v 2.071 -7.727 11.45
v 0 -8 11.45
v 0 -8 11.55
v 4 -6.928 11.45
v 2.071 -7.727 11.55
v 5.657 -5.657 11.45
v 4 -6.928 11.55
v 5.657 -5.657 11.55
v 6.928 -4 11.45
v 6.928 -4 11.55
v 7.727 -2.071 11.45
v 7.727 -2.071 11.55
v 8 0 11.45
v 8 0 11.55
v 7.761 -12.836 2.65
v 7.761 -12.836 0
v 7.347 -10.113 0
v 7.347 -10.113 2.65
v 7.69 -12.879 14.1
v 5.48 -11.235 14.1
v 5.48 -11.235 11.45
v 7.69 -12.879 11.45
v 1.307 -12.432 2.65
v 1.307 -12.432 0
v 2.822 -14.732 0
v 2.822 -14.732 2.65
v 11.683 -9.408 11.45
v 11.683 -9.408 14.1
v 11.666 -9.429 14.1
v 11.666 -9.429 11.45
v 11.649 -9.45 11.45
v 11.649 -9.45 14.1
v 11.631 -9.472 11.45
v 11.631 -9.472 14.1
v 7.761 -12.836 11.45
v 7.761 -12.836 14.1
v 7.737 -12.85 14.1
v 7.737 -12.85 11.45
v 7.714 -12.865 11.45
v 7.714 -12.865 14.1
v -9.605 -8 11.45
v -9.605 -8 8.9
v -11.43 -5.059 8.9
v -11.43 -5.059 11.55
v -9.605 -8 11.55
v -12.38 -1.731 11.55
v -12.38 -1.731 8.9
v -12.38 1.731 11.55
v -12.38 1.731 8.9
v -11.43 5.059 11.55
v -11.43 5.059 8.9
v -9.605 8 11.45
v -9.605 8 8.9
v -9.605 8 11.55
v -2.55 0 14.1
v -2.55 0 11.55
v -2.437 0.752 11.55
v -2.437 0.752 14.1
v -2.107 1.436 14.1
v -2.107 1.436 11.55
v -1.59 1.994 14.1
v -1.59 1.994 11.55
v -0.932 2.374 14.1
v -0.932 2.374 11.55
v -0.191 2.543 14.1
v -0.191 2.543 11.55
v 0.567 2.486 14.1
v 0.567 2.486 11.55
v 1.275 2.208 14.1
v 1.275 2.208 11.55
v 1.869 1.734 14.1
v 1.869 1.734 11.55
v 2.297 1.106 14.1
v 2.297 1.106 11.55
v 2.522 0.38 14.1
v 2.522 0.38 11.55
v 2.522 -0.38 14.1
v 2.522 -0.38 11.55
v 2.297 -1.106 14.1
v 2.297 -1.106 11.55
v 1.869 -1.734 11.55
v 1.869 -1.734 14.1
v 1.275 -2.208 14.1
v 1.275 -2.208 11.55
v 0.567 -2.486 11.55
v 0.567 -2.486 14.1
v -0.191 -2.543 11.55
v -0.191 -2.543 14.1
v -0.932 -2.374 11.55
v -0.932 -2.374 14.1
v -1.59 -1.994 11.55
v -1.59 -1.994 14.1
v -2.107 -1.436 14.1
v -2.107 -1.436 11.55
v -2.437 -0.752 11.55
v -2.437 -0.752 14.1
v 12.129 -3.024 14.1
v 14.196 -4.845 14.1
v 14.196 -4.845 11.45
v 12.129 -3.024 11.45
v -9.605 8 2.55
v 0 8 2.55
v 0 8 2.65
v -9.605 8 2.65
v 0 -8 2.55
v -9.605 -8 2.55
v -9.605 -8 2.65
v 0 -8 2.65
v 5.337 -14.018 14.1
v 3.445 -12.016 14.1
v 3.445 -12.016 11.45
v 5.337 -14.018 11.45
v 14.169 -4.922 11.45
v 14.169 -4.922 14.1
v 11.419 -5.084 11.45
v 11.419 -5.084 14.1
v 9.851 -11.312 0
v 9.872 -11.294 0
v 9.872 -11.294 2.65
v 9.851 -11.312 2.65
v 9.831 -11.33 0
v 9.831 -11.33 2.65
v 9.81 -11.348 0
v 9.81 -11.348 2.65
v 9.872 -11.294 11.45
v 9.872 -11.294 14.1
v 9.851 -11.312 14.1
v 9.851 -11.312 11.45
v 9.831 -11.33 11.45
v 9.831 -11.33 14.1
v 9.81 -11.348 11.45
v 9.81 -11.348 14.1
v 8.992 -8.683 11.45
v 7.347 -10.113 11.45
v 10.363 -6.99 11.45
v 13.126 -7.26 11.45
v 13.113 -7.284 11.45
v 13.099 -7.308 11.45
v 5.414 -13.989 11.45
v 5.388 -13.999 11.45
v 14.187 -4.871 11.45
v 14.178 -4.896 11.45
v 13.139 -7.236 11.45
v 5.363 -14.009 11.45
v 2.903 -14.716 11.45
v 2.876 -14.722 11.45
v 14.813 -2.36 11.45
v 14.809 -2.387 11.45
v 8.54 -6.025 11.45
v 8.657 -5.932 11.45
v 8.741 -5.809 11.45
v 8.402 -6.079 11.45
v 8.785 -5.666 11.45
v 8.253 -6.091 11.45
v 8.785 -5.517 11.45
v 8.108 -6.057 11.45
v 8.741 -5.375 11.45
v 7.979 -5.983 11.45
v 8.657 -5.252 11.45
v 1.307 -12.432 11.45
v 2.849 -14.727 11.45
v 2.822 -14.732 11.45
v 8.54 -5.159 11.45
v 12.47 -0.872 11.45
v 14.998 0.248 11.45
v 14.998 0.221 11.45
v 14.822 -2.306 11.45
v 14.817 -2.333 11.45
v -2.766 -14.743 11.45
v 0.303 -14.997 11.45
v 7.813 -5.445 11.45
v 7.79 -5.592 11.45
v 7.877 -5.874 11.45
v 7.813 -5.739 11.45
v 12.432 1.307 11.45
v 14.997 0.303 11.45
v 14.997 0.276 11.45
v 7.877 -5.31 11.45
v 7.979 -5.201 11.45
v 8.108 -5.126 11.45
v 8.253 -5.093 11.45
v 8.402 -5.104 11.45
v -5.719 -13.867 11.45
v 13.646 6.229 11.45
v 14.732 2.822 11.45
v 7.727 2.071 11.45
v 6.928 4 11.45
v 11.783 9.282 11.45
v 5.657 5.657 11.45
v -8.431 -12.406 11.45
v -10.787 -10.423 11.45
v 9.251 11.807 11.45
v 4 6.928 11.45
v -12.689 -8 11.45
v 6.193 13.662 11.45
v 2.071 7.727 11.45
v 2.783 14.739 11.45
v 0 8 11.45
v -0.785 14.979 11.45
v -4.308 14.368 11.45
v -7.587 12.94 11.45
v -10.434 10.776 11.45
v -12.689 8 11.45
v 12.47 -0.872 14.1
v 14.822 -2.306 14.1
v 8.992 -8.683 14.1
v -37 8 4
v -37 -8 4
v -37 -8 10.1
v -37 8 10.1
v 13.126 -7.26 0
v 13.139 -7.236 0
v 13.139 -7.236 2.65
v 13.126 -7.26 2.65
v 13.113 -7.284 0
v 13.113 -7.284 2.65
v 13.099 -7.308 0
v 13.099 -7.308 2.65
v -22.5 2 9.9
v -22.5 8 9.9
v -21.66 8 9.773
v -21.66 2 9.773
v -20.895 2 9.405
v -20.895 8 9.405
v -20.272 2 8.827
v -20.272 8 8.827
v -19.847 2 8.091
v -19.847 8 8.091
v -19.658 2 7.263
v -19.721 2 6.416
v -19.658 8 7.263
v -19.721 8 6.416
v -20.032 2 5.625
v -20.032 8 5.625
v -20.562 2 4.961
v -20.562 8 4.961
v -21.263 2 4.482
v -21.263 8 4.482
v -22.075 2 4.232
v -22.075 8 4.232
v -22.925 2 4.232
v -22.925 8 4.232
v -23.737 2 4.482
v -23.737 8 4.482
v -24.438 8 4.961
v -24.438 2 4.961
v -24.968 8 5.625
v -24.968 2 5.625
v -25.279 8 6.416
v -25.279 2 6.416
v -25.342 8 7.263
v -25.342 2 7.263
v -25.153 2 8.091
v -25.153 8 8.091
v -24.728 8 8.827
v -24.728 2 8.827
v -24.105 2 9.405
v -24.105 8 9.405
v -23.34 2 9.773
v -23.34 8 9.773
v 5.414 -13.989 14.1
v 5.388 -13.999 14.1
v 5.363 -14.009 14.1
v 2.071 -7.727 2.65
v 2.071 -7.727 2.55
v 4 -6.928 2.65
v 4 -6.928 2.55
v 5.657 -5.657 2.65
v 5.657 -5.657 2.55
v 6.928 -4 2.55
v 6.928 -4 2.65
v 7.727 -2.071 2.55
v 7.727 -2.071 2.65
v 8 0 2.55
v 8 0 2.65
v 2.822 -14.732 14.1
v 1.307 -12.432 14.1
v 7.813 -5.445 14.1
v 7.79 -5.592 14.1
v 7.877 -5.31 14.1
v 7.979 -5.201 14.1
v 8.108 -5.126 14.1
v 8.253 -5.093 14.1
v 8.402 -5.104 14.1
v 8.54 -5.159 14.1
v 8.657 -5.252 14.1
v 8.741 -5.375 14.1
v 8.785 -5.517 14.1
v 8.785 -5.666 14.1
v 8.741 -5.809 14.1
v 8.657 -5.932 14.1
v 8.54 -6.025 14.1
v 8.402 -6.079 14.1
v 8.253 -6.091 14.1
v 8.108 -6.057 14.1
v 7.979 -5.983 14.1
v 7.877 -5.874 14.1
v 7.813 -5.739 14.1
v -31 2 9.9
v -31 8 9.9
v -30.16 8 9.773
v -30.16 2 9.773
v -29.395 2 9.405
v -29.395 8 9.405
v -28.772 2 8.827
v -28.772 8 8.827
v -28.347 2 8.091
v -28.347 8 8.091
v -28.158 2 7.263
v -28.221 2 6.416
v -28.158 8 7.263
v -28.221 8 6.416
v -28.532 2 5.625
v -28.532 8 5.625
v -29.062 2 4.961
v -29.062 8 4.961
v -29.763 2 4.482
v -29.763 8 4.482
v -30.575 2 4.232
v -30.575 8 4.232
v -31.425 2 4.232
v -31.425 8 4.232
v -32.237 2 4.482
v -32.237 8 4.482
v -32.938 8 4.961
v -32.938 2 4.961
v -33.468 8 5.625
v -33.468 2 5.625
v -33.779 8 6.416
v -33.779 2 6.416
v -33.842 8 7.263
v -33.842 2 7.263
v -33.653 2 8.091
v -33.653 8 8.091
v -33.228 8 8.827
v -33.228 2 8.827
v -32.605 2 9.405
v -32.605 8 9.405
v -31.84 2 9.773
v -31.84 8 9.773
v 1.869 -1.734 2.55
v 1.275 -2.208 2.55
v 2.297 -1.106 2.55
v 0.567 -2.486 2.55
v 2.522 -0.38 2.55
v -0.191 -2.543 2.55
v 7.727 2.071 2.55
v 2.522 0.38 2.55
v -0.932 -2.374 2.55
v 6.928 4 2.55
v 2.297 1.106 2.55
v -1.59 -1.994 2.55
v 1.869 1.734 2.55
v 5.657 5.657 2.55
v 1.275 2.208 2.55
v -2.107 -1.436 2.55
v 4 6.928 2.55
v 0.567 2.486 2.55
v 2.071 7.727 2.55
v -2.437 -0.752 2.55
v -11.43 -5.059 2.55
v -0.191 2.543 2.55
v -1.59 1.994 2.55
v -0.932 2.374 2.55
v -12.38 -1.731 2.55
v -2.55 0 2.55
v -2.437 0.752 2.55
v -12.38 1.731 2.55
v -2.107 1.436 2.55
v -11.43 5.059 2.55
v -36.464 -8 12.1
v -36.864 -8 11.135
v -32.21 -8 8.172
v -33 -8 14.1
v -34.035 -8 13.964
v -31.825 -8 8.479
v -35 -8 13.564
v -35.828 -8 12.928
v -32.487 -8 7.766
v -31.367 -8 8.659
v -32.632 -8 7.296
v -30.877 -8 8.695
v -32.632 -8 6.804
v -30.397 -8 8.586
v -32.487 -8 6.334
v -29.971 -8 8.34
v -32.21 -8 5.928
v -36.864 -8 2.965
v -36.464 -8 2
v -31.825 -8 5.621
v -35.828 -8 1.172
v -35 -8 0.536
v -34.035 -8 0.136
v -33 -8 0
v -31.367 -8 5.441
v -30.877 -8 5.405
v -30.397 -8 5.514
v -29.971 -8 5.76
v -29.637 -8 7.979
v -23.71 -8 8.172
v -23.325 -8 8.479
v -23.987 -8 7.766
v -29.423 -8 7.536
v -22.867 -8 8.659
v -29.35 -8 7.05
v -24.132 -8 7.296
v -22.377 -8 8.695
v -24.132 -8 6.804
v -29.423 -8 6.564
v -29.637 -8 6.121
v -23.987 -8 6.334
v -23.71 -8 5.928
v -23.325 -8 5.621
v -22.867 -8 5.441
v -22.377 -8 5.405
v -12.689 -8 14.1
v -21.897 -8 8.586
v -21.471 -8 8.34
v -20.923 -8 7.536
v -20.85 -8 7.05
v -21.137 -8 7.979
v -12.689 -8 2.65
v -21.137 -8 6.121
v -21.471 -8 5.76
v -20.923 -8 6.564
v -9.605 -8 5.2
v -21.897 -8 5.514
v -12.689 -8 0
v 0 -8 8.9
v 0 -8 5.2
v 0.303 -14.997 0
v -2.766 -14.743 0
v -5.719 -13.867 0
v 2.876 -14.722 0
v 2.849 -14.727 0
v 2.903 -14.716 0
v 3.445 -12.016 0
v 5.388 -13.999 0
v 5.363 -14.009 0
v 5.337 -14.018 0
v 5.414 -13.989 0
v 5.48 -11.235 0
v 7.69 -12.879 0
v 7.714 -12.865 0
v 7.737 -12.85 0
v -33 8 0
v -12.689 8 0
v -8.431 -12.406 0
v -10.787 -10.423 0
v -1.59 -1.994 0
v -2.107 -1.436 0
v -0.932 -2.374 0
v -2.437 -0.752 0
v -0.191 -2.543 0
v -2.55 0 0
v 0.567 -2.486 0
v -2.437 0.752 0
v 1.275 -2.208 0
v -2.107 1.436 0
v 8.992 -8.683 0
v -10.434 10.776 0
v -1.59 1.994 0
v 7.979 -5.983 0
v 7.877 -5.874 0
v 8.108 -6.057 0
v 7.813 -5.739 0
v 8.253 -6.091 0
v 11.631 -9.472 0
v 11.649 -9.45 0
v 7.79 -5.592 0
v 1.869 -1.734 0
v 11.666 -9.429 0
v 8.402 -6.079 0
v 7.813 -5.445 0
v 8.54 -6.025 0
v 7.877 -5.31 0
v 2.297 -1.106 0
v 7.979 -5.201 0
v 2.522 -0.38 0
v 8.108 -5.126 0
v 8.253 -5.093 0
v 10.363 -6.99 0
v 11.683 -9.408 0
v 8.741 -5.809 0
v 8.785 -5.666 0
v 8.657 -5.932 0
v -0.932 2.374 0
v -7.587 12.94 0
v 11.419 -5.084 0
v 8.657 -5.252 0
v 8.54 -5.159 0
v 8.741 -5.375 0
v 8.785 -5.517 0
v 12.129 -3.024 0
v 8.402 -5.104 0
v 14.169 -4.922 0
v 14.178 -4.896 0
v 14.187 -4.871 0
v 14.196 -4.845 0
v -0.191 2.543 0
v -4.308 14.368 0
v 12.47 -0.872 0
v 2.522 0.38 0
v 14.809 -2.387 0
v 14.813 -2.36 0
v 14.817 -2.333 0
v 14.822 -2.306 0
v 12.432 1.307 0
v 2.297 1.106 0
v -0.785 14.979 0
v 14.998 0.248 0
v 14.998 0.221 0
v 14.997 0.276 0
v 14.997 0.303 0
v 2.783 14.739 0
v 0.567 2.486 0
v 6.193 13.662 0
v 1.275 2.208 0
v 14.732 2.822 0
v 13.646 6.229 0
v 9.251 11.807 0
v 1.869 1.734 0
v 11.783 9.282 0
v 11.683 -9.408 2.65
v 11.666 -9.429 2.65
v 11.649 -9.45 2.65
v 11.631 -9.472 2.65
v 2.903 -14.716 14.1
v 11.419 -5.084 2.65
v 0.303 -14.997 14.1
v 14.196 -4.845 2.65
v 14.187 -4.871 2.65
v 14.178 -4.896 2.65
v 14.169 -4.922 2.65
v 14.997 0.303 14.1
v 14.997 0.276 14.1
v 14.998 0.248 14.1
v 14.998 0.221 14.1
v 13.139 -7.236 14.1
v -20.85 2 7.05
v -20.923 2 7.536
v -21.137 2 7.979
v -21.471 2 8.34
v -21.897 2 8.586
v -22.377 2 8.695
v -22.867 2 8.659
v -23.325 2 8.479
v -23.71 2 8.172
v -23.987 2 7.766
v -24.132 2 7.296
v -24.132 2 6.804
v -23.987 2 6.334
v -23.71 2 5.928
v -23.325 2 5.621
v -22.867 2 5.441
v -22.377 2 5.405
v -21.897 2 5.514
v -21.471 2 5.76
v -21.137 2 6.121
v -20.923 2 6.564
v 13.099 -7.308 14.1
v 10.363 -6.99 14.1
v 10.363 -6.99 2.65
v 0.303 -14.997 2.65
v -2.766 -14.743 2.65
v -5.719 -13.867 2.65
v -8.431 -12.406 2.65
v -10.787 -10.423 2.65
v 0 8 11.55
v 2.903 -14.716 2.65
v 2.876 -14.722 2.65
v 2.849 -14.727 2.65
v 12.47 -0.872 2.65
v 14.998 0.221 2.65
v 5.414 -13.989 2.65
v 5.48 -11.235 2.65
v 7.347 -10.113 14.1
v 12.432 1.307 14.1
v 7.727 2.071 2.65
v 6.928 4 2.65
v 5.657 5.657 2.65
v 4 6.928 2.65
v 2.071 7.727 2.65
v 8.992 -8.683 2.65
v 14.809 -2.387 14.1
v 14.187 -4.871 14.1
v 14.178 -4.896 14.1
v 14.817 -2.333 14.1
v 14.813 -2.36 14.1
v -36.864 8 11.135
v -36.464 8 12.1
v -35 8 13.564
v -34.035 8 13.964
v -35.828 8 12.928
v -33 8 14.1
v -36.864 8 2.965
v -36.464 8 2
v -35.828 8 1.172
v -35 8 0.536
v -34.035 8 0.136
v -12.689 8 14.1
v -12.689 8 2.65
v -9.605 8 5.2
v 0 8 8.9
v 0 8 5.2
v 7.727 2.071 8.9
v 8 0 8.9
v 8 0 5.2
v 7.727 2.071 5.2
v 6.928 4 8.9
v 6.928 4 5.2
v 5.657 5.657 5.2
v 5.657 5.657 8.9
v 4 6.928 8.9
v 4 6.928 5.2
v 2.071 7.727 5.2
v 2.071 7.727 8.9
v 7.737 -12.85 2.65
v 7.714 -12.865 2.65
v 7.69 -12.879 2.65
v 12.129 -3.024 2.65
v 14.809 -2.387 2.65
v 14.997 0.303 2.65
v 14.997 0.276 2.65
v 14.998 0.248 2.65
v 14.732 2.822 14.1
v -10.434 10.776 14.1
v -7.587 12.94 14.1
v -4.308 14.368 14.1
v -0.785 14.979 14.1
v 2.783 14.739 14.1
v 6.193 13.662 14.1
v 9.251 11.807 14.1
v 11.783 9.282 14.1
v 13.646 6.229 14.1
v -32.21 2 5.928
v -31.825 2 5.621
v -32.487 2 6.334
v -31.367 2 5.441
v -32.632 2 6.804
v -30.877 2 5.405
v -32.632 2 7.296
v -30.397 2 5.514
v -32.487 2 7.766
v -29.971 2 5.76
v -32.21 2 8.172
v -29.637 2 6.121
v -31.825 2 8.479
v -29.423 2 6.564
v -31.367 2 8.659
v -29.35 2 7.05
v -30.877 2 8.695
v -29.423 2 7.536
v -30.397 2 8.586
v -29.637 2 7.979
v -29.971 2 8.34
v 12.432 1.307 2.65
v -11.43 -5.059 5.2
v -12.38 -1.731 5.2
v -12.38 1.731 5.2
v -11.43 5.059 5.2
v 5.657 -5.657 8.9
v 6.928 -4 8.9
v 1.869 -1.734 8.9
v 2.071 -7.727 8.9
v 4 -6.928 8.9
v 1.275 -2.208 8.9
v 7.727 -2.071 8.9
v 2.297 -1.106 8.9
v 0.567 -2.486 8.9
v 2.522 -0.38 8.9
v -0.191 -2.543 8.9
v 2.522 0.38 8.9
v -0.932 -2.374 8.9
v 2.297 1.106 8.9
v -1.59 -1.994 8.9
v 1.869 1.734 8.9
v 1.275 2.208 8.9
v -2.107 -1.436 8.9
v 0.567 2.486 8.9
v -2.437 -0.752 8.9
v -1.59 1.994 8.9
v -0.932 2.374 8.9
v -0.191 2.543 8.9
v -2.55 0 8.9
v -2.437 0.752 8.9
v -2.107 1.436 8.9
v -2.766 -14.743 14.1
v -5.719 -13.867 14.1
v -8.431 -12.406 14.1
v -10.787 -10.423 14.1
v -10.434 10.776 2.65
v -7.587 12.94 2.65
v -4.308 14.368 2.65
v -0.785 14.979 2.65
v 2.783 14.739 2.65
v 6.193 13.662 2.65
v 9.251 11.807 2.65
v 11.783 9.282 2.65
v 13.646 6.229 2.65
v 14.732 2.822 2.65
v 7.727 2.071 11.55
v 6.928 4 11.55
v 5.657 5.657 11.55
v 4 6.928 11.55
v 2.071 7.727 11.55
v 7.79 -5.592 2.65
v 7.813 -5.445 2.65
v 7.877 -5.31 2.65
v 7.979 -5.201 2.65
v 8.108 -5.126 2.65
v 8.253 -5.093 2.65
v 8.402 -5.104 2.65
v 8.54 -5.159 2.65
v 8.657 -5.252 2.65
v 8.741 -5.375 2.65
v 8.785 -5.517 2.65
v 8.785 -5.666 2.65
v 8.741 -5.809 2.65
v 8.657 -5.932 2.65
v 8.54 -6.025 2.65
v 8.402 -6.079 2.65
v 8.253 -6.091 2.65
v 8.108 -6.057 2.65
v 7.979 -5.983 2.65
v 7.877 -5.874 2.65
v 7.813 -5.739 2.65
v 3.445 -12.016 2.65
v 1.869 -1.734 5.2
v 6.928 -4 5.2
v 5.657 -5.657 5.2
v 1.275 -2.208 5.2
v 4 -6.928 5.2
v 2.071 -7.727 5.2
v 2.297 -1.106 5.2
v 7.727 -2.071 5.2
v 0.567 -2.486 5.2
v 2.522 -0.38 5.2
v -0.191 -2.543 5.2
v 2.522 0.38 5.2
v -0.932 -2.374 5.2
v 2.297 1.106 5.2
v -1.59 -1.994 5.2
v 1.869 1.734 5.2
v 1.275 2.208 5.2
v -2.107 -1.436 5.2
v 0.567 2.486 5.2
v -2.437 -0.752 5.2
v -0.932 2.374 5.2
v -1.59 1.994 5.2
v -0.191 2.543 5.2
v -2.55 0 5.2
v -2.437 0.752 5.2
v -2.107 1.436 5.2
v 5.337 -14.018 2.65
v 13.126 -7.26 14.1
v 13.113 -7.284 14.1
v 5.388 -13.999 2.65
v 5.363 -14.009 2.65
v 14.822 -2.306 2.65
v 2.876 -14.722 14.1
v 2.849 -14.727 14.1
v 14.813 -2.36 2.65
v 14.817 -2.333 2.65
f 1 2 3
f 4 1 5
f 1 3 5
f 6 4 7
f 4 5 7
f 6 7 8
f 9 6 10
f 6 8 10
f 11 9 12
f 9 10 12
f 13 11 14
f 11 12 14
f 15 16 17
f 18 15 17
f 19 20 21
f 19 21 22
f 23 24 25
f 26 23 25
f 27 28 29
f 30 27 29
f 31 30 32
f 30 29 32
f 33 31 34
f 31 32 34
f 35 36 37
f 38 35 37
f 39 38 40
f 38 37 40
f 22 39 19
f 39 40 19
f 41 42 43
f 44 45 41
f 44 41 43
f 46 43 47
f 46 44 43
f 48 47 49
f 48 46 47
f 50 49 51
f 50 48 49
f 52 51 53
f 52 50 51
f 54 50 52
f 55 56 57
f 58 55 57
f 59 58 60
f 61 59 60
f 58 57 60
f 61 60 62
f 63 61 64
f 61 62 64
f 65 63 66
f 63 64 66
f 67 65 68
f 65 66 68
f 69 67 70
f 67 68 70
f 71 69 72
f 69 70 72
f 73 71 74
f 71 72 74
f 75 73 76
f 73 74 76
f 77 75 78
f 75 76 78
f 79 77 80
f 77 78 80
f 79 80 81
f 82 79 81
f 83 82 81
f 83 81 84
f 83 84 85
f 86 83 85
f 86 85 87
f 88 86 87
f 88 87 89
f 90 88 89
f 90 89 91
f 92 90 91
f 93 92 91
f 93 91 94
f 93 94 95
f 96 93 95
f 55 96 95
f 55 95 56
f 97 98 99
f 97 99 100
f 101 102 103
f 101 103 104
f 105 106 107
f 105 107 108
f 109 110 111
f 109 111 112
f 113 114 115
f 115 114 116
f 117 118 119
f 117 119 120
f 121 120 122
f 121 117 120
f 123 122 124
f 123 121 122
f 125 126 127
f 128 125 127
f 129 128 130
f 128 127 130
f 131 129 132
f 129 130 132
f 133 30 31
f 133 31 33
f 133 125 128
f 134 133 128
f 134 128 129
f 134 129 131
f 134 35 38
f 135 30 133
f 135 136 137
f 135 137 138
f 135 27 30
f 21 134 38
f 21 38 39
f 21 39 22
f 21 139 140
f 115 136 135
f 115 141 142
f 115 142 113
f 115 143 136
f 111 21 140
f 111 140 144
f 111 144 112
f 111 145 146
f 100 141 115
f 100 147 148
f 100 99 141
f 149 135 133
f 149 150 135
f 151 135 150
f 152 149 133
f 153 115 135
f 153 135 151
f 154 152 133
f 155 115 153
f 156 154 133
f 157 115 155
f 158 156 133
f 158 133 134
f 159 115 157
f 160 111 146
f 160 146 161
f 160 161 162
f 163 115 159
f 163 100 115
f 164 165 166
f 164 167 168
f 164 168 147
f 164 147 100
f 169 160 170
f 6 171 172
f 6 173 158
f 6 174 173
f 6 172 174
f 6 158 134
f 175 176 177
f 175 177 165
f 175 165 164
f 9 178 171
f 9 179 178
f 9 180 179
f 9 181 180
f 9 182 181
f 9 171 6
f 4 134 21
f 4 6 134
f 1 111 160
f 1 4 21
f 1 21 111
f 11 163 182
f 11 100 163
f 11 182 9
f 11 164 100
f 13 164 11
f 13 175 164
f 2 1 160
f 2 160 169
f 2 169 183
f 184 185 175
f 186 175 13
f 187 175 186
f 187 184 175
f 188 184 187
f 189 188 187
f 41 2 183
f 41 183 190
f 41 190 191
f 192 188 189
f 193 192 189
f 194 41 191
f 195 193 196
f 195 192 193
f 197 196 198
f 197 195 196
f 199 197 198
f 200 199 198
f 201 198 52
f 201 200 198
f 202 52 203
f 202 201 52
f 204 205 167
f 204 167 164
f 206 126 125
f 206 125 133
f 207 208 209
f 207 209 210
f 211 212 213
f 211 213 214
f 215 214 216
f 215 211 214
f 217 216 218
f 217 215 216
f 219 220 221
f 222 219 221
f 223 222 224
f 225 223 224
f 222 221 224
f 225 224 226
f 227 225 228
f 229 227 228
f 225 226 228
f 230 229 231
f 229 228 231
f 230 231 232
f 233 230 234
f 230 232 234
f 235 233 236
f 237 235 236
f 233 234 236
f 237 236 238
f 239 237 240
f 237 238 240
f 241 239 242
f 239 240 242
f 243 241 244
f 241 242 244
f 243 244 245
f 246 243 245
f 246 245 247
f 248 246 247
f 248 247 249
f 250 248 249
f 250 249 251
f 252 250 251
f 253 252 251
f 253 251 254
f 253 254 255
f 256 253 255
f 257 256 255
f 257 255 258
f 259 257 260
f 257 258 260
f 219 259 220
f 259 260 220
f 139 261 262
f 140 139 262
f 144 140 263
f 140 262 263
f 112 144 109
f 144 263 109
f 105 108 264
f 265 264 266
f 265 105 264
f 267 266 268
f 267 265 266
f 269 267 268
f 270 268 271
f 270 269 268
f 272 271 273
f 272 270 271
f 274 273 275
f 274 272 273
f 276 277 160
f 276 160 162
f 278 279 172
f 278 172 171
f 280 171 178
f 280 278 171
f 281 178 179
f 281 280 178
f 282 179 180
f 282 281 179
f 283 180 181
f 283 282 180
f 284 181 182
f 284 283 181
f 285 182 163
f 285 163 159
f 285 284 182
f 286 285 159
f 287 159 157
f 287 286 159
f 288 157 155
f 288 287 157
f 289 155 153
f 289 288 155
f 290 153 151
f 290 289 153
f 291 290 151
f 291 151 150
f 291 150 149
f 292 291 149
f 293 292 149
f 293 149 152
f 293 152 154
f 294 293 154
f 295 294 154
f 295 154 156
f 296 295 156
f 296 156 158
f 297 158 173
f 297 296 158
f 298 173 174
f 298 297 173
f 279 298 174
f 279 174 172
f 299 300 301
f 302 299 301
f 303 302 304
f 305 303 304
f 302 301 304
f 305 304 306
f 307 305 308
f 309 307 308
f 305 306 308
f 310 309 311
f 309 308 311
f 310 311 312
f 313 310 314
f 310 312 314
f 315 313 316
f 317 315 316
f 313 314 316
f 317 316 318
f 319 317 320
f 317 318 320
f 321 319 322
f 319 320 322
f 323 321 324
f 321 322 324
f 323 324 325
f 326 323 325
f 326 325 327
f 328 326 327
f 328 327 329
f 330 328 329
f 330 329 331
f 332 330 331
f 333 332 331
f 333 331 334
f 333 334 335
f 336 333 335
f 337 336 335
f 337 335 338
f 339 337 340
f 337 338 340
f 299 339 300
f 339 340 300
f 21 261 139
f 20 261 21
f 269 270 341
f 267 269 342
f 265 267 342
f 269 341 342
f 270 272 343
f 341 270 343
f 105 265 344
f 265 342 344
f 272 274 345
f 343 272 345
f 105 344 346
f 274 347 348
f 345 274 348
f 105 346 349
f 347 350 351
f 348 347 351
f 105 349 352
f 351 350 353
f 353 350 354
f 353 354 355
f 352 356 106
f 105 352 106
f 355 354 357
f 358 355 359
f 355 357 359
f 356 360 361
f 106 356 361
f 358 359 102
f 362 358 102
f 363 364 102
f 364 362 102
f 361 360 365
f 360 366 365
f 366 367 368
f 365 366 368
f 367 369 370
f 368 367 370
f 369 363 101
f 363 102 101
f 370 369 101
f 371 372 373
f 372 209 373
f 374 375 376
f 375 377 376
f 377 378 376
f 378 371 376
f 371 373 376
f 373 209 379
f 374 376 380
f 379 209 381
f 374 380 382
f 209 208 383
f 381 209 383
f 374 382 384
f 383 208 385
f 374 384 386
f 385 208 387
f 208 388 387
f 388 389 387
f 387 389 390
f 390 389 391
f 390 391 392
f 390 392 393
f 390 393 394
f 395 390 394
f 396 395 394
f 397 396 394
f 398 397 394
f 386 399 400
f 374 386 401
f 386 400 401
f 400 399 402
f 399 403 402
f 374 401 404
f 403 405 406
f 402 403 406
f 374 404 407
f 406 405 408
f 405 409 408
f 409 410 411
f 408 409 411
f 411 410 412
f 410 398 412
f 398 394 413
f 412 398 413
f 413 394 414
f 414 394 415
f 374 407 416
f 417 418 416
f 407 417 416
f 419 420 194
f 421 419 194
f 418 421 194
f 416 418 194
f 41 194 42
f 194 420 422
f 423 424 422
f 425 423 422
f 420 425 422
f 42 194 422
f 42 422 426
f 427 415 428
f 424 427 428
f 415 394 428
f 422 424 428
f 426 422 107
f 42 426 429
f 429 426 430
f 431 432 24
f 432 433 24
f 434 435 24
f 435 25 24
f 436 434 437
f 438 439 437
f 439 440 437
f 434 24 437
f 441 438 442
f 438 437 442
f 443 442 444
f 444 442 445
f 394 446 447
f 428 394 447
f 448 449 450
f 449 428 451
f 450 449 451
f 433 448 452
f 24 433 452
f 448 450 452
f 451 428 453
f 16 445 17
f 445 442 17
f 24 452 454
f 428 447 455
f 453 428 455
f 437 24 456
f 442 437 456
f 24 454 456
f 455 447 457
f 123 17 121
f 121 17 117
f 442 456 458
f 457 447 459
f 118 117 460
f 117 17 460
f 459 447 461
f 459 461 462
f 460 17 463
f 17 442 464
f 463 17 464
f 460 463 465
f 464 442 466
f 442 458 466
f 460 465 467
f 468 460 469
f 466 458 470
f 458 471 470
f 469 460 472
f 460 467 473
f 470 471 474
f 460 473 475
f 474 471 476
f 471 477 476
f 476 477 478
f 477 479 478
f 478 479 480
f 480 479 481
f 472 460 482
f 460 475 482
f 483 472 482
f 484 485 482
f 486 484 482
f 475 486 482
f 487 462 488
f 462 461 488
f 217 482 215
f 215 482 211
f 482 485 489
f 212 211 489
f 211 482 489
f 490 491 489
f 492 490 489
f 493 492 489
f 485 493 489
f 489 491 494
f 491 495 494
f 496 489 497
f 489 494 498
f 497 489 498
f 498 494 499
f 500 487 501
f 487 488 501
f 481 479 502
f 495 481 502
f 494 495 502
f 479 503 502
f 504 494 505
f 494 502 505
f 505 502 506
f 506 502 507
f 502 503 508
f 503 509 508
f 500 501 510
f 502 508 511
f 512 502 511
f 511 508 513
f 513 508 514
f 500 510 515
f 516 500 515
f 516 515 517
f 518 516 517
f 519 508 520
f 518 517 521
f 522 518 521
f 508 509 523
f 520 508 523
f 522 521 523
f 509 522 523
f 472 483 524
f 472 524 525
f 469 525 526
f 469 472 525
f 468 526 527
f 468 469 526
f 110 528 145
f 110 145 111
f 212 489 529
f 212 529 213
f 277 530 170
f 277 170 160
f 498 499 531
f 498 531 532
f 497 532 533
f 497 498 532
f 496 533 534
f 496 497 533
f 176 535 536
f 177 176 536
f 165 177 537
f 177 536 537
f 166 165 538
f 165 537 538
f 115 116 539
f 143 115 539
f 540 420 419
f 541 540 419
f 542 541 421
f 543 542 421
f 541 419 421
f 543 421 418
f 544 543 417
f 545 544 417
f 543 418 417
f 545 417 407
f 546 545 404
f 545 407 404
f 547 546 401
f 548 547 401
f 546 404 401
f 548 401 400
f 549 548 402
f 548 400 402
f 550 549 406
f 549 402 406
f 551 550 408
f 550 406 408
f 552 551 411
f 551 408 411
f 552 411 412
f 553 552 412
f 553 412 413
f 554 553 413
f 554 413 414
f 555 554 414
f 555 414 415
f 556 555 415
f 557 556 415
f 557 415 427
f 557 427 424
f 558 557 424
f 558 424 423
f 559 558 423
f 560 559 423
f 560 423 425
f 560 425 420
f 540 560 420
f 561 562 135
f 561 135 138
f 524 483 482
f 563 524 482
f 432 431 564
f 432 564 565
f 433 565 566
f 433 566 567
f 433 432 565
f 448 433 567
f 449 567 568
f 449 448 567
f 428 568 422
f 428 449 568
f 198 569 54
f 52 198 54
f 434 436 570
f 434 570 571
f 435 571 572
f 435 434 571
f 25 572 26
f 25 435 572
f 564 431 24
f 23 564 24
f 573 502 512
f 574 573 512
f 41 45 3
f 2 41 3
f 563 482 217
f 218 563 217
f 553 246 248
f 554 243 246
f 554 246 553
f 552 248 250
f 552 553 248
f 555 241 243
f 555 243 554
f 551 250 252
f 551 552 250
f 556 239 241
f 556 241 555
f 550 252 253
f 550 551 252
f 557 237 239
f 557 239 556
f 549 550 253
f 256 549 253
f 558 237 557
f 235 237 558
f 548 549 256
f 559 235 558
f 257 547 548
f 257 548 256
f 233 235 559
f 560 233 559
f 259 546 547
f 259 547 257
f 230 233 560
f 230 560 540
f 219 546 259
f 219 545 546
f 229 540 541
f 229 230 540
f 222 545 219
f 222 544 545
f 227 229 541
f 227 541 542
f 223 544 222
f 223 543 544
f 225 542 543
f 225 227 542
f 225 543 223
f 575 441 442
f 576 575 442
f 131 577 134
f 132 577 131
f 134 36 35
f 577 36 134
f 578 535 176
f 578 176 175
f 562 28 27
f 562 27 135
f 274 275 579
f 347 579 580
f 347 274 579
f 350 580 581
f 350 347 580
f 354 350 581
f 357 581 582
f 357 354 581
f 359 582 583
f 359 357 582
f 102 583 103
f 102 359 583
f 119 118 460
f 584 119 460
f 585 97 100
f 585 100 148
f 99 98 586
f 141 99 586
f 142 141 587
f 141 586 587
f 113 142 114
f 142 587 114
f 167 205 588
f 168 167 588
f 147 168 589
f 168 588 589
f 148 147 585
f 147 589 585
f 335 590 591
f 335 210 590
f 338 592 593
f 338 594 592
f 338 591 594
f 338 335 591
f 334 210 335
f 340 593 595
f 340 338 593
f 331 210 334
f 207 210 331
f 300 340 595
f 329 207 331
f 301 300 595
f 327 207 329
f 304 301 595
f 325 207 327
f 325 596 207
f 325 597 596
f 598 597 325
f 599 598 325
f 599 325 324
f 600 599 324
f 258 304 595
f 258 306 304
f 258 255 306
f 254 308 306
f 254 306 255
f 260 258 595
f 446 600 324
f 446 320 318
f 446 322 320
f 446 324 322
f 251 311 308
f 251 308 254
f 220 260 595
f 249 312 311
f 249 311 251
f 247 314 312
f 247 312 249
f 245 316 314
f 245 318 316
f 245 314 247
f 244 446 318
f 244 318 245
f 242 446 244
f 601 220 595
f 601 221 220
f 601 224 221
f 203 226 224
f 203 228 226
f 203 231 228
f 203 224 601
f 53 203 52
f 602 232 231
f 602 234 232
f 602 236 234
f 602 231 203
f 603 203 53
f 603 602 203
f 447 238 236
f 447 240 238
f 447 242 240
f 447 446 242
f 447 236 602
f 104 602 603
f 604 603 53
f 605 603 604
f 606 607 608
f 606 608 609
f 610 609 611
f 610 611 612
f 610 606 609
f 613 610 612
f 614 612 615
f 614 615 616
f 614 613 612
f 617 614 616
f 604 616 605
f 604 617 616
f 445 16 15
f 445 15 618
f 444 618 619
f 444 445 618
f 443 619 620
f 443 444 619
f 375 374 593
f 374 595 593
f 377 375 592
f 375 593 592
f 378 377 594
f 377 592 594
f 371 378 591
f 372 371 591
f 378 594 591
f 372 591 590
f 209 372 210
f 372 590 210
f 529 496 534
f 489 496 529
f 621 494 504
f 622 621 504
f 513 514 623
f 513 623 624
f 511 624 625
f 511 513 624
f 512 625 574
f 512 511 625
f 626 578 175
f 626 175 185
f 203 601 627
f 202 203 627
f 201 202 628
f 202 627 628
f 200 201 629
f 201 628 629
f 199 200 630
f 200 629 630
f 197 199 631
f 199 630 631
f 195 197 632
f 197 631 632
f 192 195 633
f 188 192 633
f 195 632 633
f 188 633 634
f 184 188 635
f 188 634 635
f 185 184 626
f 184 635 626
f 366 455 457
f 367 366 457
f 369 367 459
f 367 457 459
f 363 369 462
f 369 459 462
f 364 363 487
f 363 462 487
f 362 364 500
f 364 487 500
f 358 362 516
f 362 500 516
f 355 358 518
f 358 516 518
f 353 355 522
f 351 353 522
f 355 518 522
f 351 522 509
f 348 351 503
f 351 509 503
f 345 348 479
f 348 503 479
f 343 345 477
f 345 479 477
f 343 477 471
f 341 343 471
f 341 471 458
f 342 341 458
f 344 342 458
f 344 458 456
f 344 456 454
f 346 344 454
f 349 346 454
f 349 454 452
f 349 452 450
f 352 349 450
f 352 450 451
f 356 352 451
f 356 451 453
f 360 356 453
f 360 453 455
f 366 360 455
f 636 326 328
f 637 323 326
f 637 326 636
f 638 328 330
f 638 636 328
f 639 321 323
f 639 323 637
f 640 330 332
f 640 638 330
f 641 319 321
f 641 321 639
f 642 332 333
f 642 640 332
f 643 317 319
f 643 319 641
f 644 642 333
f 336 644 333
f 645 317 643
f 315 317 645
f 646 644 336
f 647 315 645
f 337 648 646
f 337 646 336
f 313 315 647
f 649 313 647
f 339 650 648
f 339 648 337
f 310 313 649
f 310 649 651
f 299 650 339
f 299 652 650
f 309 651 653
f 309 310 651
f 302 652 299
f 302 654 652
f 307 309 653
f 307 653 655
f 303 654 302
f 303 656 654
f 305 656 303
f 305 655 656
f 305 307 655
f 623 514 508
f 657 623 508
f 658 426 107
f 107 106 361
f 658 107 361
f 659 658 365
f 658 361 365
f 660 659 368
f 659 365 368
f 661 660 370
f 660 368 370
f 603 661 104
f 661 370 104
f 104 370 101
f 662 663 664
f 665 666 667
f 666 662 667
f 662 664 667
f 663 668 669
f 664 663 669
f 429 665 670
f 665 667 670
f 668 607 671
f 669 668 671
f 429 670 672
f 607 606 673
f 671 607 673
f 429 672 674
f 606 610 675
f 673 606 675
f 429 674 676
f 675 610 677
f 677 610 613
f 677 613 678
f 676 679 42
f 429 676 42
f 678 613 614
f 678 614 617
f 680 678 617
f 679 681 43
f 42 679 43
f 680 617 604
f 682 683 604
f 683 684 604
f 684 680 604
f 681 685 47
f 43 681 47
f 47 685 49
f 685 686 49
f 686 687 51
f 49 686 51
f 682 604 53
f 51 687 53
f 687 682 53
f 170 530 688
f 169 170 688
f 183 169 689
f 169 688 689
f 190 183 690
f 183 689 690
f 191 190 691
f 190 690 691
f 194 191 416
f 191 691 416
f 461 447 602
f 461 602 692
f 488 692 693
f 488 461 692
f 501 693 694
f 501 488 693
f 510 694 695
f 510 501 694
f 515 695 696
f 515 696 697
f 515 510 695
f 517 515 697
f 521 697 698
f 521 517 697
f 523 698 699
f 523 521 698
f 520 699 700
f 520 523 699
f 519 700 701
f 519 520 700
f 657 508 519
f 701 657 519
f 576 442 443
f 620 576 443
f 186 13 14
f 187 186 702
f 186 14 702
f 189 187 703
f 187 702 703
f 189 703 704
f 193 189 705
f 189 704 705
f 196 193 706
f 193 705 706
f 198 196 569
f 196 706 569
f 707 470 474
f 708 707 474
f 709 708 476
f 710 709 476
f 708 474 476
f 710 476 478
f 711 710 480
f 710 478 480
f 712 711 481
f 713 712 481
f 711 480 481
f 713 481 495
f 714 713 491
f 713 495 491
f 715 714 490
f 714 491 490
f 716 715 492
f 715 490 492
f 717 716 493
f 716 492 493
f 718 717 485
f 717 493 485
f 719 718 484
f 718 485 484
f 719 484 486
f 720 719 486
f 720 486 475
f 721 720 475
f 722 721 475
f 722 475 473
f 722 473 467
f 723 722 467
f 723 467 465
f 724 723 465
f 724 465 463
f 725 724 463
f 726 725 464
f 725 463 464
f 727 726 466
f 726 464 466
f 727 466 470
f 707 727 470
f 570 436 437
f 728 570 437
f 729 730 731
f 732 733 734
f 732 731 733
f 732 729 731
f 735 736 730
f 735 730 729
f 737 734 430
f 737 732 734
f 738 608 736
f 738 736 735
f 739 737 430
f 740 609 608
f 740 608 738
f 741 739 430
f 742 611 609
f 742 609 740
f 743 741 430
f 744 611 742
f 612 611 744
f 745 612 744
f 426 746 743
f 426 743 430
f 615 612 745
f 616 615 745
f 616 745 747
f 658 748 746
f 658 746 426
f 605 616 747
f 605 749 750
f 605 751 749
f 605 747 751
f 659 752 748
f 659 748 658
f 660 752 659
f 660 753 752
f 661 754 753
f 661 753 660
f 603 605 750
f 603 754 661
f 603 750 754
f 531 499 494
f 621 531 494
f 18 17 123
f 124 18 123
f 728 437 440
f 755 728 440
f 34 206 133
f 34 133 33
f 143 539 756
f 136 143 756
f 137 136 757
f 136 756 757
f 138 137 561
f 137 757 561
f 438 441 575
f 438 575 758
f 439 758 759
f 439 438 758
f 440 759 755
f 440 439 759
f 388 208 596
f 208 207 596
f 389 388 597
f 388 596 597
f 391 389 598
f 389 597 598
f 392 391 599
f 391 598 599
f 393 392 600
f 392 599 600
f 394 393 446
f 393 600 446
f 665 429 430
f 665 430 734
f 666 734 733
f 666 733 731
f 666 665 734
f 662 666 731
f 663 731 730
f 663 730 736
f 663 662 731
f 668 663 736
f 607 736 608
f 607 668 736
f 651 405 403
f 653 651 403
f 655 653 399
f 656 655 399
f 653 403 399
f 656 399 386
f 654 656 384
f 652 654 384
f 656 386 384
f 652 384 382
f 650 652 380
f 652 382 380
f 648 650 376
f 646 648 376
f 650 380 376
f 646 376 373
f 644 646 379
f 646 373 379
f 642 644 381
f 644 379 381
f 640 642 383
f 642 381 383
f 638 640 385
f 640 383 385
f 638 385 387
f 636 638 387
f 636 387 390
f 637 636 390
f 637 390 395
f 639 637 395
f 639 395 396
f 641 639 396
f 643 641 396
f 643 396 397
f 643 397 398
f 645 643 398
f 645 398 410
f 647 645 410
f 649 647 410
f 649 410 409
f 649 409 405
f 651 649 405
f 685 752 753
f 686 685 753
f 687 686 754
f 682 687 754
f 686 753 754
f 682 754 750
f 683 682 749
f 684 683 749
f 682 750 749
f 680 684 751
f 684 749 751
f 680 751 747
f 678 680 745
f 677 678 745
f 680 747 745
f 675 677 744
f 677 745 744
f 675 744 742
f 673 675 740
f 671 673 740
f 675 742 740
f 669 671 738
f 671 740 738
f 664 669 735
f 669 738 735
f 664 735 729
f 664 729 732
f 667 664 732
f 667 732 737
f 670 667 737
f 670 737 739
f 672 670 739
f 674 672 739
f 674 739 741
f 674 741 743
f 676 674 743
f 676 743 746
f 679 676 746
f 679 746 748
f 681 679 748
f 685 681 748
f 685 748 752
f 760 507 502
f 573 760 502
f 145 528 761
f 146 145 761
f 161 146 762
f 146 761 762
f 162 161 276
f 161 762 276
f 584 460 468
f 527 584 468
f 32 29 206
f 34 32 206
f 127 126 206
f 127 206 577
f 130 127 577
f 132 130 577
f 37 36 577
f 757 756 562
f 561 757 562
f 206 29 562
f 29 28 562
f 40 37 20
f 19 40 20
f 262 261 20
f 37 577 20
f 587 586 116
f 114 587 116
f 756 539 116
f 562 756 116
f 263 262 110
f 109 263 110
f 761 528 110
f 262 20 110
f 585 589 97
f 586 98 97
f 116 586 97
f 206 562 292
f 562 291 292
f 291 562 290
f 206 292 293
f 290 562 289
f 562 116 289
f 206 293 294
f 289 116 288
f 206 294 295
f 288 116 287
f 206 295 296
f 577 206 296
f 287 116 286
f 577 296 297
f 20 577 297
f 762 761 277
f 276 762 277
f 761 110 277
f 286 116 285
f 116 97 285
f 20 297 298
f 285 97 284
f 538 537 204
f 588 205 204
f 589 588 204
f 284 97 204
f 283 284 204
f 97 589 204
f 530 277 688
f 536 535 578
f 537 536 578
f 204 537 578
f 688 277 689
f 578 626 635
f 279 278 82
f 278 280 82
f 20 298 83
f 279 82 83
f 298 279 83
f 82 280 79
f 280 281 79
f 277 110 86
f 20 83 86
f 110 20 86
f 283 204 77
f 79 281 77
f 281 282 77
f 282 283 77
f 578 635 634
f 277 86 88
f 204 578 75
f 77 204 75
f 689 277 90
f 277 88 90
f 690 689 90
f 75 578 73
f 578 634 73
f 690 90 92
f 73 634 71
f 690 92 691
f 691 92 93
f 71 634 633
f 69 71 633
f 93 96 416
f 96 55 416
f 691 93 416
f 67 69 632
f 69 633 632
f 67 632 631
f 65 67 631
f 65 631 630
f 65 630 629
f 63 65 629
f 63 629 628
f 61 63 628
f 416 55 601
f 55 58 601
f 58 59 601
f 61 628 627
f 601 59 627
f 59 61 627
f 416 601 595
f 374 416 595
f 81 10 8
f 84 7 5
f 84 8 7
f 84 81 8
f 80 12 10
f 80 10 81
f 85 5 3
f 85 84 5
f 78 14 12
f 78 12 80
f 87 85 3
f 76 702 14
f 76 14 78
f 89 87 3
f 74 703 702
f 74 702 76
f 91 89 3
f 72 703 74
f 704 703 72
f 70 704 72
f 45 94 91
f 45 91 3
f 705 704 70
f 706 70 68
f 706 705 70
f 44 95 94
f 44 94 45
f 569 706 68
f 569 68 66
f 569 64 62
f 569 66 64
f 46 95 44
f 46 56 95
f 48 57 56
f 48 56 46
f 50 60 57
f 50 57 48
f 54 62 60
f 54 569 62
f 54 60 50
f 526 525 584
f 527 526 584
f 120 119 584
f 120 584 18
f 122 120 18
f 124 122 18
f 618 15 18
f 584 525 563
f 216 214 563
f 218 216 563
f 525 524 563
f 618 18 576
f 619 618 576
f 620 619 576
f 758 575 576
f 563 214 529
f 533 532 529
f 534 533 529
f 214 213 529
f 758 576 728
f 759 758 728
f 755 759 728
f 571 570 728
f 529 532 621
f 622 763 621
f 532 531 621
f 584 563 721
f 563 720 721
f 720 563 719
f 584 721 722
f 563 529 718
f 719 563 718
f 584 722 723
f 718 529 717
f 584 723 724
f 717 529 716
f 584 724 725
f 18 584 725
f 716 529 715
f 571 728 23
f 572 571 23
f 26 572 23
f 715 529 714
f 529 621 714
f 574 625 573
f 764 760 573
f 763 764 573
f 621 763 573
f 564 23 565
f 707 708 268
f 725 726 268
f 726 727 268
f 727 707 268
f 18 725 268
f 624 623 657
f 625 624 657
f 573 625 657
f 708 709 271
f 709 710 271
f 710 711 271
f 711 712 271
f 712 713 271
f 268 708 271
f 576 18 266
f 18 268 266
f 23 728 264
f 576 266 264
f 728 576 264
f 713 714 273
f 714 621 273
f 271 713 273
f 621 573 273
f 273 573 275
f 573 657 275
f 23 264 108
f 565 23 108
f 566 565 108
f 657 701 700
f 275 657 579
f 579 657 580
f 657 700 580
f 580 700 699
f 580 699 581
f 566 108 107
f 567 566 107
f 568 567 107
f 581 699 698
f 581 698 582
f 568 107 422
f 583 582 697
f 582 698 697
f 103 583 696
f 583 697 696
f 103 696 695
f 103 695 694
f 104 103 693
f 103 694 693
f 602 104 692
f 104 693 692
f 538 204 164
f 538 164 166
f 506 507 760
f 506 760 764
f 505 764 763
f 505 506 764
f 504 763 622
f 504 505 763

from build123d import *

# Parameters (mm, degrees)
SKETCH1_W           = 45
SKETCH1_H           = 16
BOSS_EXTRUDE1_DEPTH = 14.1
FILLET1_R           = 8
SKETCH2_R           = 1.65
CUT_EXTRUDE1_DEPTH  = 21.1
SKETCH4_R           = 12.5
CUT_EXTRUDE2_DEPTH  = 2.65
BOSS_EXTRUDE3_DEPTH = 2.65
SKETCH7_R           = 0.5
CUT_EXTRUDE3_DEPTH  = 2.65
FILLET2_R           = 4
SKETCH8_R           = 2.55
CUT_EXTRUDE4_DEPTH  = 21.65
SKETCH9_R           = 2.85
CUT_EXTRUDE5_DEPTH  = 6


with BuildPart() as part:
    # Sketch1 → Boss-Extrude1 (new body)
    with BuildSketch(Plane.XY):
        with Locations((-14.5, 0)):
            Rectangle(SKETCH1_W, SKETCH1_H)
    extrude(amount=BOSS_EXTRUDE1_DEPTH)

    # Fillet1
    fillet1_edges = [part.edges().sort_by_distance(p)[0] for p in [
        (8, -8, 7.05),
        (8, 8, 7.05),
    ]]
    fillet(fillet1_edges, radius=FILLET1_R - 0.0001)  # a hair under: the kernel refuses the full size

    # Sketch2 → Cut-Extrude1 (cut)
    with BuildSketch(Plane.XZ.offset(8)):
        with Locations((-22.5, 7.05)):
            Circle(SKETCH2_R)
        with Locations((-31, 7.05)):
            Circle(SKETCH2_R)
    extrude(amount=-CUT_EXTRUDE1_DEPTH, mode=Mode.SUBTRACT)

    # Sketch4 → Cut-Extrude2 (cut)
    with BuildSketch(Plane(origin=(0, 0, 2.55), x_dir=(-1, 0, 0), z_dir=(0, 0, -1))):
        Circle(SKETCH4_R)
    cut_extrude2 = extrude(amount=-CUT_EXTRUDE2_DEPTH, mode=Mode.SUBTRACT)

    # Mirror1: Cut-Extrude2 across plane
    add(cut_extrude2.mirror(Plane(origin=(0, 0, 7.05), x_dir=(1, 0, 0), z_dir=(0, 0, -1))), mode=Mode.SUBTRACT)

    # Sketch6 → Boss-Extrude3 (add)
    with BuildSketch(Plane(origin=(0, 0, 0), x_dir=(-1, 0, 0), z_dir=(0, 0, -1))):
        with BuildLine():
            Line((0, 8), (12.68857754, 8))
            ThreePointArc((12.68857754, 8), (-15, 0), (12.68857754, -8))
            Line((12.68857754, -8), (0, -8))
            ThreePointArc((0, -8), (-5.656854249, -5.656854249), (-8, 0))
            ThreePointArc((-8, 0), (-5.656854249, 5.656854249), (0, 8))
        make_face()
    boss_extrude3 = extrude(amount=-BOSS_EXTRUDE3_DEPTH)

    # Sketch7 → Cut-Extrude3 (cut)
    with BuildSketch(Plane(origin=(0, 0, 0), x_dir=(-1, 0, 0), z_dir=(0, 0, -1))):
        with BuildLine():
            Line((-10.362969657, -6.989911293), (-13.099285488, -7.308126963))
            ThreePointArc((-13.099285488, -7.308126963), (-12.435563588, -8.387893552), (-11.68305604, -9.407773465))
            Line((-11.68305604, -9.407773465), (-10.362969657, -6.989911293))
        make_face()
        with BuildLine():
            Line((-8.991747504, -8.683229631), (-11.631234978, -9.471767147))
            ThreePointArc((-11.631234978, -9.471767147), (-10.790097005, -10.419875557), (-9.871921449, -11.293589638))
            Line((-9.871921449, -11.293589638), (-8.991747504, -8.683229631))
        make_face()
        with BuildLine():
            Line((-7.347315654, -10.11271243), (-9.809775279, -11.347612479))
            ThreePointArc((-9.809775279, -11.347612479), (-8.816778784, -12.135254916), (-7.76083352, -12.836255804))
            Line((-7.76083352, -12.836255804), (-7.347315654, -10.11271243))
        make_face()
        with BuildLine():
            Line((-5.479639335, -11.234925579), (-7.690250522, -12.878666348))
            ThreePointArc((-7.690250522, -12.878666348), (-6.575567202, -13.481910694), (-5.413936592, -13.988898834))
            Line((-5.413936592, -13.988898834), (-5.479639335, -11.234925579))
        make_face()
        with BuildLine():
            Line((-3.445466948, -12.015771199), (-5.337061395, -14.018408457))
            ThreePointArc((-5.337061395, -14.018408457), (-4.134560337, -14.418925439), (-2.90253994, -14.716496251))
            Line((-2.90253994, -14.716496251), (-3.445466948, -12.015771199))
        make_face()
        with BuildLine():
            ThreePointArc((-14.808828542, -2.387173479), (-14.554435894, -3.628828434), (-14.196129578, -4.844574801))
            Line((-14.196129578, -4.844574801), (-12.128696578, -3.024023695))
            Line((-12.128696578, -3.024023695), (-14.808828542, -2.387173479))
        make_face()
        with BuildLine():
            ThreePointArc((-14.998377485, 0.22061914), (-14.963460754, -1.046347106), (-14.821710057, -2.305842793))
            Line((-14.821710057, -2.305842793), (-12.469550628, -0.871955922))
            Line((-12.469550628, -0.871955922), (-14.998377485, 0.22061914))
        make_face()
        with Locations((-8.290375726, -5.591929035)):
            Circle(SKETCH7_R)
        with BuildLine():
            Line((-1.306605791, -12.431523692), (-2.821708358, -14.732208319))
            ThreePointArc((-2.821708358, -14.732208319), (-1.567926949, -14.917828431), (-0.302951081, -14.996940376))
            Line((-0.302951081, -14.996940376), (-1.306605791, -12.431523692))
        make_face()
        with BuildLine():
            ThreePointArc((-14.732208319, 2.821708358), (-14.917828431, 1.567926949), (-14.996940376, 0.302951081))
            Line((-14.996940376, 0.302951081), (-12.431523692, 1.306605791))
            Line((-12.431523692, 1.306605791), (-14.732208319, 2.821708358))
        make_face()
        Polygon((-11.419318221, -5.084208038), (-13.206757578, -7.320625266), (-14.277330492, -4.916079132), align=None)
    cut_extrude3 = extrude(amount=-CUT_EXTRUDE3_DEPTH, mode=Mode.SUBTRACT)

    # Mirror8: Boss-Extrude3, Cut-Extrude3 across plane
    add(boss_extrude3.mirror(Plane(origin=(0, 0, 7.05), x_dir=(1, 0, 0), z_dir=(0, 0, -1))))
    add(cut_extrude3.mirror(Plane(origin=(0, 0, 7.05), x_dir=(1, 0, 0), z_dir=(0, 0, -1))), mode=Mode.SUBTRACT)

    # Fillet2
    fillet2_edges = [part.edges().sort_by_distance(p)[0] for p in [
        (-37, 0, 14.1),
        (-37, 0, 0),
    ]]
    fillet(fillet2_edges, radius=FILLET2_R)

    # Sketch8 → Cut-Extrude4 (cut)
    with BuildSketch(Plane(origin=(0, 0, 0), x_dir=(-1, 0, 0), z_dir=(0, 0, -1))):
        Circle(SKETCH8_R)
    extrude(amount=-CUT_EXTRUDE4_DEPTH, mode=Mode.SUBTRACT)

    # Sketch9 → Cut-Extrude5 (cut)
    with BuildSketch(Plane(origin=(0, 8, 0), x_dir=(1, 0, 0), z_dir=(0, 1, 0))):
        with Locations(Location((-31, -7.05, 0), (0, 0, 270))):
            Circle(SKETCH9_R)
        with Locations(Location((-22.5, -7.05, 0), (0, 0, 270))):
            Circle(SKETCH9_R)
    extrude(amount=-CUT_EXTRUDE5_DEPTH, mode=Mode.SUBTRACT)


solid = part.part
